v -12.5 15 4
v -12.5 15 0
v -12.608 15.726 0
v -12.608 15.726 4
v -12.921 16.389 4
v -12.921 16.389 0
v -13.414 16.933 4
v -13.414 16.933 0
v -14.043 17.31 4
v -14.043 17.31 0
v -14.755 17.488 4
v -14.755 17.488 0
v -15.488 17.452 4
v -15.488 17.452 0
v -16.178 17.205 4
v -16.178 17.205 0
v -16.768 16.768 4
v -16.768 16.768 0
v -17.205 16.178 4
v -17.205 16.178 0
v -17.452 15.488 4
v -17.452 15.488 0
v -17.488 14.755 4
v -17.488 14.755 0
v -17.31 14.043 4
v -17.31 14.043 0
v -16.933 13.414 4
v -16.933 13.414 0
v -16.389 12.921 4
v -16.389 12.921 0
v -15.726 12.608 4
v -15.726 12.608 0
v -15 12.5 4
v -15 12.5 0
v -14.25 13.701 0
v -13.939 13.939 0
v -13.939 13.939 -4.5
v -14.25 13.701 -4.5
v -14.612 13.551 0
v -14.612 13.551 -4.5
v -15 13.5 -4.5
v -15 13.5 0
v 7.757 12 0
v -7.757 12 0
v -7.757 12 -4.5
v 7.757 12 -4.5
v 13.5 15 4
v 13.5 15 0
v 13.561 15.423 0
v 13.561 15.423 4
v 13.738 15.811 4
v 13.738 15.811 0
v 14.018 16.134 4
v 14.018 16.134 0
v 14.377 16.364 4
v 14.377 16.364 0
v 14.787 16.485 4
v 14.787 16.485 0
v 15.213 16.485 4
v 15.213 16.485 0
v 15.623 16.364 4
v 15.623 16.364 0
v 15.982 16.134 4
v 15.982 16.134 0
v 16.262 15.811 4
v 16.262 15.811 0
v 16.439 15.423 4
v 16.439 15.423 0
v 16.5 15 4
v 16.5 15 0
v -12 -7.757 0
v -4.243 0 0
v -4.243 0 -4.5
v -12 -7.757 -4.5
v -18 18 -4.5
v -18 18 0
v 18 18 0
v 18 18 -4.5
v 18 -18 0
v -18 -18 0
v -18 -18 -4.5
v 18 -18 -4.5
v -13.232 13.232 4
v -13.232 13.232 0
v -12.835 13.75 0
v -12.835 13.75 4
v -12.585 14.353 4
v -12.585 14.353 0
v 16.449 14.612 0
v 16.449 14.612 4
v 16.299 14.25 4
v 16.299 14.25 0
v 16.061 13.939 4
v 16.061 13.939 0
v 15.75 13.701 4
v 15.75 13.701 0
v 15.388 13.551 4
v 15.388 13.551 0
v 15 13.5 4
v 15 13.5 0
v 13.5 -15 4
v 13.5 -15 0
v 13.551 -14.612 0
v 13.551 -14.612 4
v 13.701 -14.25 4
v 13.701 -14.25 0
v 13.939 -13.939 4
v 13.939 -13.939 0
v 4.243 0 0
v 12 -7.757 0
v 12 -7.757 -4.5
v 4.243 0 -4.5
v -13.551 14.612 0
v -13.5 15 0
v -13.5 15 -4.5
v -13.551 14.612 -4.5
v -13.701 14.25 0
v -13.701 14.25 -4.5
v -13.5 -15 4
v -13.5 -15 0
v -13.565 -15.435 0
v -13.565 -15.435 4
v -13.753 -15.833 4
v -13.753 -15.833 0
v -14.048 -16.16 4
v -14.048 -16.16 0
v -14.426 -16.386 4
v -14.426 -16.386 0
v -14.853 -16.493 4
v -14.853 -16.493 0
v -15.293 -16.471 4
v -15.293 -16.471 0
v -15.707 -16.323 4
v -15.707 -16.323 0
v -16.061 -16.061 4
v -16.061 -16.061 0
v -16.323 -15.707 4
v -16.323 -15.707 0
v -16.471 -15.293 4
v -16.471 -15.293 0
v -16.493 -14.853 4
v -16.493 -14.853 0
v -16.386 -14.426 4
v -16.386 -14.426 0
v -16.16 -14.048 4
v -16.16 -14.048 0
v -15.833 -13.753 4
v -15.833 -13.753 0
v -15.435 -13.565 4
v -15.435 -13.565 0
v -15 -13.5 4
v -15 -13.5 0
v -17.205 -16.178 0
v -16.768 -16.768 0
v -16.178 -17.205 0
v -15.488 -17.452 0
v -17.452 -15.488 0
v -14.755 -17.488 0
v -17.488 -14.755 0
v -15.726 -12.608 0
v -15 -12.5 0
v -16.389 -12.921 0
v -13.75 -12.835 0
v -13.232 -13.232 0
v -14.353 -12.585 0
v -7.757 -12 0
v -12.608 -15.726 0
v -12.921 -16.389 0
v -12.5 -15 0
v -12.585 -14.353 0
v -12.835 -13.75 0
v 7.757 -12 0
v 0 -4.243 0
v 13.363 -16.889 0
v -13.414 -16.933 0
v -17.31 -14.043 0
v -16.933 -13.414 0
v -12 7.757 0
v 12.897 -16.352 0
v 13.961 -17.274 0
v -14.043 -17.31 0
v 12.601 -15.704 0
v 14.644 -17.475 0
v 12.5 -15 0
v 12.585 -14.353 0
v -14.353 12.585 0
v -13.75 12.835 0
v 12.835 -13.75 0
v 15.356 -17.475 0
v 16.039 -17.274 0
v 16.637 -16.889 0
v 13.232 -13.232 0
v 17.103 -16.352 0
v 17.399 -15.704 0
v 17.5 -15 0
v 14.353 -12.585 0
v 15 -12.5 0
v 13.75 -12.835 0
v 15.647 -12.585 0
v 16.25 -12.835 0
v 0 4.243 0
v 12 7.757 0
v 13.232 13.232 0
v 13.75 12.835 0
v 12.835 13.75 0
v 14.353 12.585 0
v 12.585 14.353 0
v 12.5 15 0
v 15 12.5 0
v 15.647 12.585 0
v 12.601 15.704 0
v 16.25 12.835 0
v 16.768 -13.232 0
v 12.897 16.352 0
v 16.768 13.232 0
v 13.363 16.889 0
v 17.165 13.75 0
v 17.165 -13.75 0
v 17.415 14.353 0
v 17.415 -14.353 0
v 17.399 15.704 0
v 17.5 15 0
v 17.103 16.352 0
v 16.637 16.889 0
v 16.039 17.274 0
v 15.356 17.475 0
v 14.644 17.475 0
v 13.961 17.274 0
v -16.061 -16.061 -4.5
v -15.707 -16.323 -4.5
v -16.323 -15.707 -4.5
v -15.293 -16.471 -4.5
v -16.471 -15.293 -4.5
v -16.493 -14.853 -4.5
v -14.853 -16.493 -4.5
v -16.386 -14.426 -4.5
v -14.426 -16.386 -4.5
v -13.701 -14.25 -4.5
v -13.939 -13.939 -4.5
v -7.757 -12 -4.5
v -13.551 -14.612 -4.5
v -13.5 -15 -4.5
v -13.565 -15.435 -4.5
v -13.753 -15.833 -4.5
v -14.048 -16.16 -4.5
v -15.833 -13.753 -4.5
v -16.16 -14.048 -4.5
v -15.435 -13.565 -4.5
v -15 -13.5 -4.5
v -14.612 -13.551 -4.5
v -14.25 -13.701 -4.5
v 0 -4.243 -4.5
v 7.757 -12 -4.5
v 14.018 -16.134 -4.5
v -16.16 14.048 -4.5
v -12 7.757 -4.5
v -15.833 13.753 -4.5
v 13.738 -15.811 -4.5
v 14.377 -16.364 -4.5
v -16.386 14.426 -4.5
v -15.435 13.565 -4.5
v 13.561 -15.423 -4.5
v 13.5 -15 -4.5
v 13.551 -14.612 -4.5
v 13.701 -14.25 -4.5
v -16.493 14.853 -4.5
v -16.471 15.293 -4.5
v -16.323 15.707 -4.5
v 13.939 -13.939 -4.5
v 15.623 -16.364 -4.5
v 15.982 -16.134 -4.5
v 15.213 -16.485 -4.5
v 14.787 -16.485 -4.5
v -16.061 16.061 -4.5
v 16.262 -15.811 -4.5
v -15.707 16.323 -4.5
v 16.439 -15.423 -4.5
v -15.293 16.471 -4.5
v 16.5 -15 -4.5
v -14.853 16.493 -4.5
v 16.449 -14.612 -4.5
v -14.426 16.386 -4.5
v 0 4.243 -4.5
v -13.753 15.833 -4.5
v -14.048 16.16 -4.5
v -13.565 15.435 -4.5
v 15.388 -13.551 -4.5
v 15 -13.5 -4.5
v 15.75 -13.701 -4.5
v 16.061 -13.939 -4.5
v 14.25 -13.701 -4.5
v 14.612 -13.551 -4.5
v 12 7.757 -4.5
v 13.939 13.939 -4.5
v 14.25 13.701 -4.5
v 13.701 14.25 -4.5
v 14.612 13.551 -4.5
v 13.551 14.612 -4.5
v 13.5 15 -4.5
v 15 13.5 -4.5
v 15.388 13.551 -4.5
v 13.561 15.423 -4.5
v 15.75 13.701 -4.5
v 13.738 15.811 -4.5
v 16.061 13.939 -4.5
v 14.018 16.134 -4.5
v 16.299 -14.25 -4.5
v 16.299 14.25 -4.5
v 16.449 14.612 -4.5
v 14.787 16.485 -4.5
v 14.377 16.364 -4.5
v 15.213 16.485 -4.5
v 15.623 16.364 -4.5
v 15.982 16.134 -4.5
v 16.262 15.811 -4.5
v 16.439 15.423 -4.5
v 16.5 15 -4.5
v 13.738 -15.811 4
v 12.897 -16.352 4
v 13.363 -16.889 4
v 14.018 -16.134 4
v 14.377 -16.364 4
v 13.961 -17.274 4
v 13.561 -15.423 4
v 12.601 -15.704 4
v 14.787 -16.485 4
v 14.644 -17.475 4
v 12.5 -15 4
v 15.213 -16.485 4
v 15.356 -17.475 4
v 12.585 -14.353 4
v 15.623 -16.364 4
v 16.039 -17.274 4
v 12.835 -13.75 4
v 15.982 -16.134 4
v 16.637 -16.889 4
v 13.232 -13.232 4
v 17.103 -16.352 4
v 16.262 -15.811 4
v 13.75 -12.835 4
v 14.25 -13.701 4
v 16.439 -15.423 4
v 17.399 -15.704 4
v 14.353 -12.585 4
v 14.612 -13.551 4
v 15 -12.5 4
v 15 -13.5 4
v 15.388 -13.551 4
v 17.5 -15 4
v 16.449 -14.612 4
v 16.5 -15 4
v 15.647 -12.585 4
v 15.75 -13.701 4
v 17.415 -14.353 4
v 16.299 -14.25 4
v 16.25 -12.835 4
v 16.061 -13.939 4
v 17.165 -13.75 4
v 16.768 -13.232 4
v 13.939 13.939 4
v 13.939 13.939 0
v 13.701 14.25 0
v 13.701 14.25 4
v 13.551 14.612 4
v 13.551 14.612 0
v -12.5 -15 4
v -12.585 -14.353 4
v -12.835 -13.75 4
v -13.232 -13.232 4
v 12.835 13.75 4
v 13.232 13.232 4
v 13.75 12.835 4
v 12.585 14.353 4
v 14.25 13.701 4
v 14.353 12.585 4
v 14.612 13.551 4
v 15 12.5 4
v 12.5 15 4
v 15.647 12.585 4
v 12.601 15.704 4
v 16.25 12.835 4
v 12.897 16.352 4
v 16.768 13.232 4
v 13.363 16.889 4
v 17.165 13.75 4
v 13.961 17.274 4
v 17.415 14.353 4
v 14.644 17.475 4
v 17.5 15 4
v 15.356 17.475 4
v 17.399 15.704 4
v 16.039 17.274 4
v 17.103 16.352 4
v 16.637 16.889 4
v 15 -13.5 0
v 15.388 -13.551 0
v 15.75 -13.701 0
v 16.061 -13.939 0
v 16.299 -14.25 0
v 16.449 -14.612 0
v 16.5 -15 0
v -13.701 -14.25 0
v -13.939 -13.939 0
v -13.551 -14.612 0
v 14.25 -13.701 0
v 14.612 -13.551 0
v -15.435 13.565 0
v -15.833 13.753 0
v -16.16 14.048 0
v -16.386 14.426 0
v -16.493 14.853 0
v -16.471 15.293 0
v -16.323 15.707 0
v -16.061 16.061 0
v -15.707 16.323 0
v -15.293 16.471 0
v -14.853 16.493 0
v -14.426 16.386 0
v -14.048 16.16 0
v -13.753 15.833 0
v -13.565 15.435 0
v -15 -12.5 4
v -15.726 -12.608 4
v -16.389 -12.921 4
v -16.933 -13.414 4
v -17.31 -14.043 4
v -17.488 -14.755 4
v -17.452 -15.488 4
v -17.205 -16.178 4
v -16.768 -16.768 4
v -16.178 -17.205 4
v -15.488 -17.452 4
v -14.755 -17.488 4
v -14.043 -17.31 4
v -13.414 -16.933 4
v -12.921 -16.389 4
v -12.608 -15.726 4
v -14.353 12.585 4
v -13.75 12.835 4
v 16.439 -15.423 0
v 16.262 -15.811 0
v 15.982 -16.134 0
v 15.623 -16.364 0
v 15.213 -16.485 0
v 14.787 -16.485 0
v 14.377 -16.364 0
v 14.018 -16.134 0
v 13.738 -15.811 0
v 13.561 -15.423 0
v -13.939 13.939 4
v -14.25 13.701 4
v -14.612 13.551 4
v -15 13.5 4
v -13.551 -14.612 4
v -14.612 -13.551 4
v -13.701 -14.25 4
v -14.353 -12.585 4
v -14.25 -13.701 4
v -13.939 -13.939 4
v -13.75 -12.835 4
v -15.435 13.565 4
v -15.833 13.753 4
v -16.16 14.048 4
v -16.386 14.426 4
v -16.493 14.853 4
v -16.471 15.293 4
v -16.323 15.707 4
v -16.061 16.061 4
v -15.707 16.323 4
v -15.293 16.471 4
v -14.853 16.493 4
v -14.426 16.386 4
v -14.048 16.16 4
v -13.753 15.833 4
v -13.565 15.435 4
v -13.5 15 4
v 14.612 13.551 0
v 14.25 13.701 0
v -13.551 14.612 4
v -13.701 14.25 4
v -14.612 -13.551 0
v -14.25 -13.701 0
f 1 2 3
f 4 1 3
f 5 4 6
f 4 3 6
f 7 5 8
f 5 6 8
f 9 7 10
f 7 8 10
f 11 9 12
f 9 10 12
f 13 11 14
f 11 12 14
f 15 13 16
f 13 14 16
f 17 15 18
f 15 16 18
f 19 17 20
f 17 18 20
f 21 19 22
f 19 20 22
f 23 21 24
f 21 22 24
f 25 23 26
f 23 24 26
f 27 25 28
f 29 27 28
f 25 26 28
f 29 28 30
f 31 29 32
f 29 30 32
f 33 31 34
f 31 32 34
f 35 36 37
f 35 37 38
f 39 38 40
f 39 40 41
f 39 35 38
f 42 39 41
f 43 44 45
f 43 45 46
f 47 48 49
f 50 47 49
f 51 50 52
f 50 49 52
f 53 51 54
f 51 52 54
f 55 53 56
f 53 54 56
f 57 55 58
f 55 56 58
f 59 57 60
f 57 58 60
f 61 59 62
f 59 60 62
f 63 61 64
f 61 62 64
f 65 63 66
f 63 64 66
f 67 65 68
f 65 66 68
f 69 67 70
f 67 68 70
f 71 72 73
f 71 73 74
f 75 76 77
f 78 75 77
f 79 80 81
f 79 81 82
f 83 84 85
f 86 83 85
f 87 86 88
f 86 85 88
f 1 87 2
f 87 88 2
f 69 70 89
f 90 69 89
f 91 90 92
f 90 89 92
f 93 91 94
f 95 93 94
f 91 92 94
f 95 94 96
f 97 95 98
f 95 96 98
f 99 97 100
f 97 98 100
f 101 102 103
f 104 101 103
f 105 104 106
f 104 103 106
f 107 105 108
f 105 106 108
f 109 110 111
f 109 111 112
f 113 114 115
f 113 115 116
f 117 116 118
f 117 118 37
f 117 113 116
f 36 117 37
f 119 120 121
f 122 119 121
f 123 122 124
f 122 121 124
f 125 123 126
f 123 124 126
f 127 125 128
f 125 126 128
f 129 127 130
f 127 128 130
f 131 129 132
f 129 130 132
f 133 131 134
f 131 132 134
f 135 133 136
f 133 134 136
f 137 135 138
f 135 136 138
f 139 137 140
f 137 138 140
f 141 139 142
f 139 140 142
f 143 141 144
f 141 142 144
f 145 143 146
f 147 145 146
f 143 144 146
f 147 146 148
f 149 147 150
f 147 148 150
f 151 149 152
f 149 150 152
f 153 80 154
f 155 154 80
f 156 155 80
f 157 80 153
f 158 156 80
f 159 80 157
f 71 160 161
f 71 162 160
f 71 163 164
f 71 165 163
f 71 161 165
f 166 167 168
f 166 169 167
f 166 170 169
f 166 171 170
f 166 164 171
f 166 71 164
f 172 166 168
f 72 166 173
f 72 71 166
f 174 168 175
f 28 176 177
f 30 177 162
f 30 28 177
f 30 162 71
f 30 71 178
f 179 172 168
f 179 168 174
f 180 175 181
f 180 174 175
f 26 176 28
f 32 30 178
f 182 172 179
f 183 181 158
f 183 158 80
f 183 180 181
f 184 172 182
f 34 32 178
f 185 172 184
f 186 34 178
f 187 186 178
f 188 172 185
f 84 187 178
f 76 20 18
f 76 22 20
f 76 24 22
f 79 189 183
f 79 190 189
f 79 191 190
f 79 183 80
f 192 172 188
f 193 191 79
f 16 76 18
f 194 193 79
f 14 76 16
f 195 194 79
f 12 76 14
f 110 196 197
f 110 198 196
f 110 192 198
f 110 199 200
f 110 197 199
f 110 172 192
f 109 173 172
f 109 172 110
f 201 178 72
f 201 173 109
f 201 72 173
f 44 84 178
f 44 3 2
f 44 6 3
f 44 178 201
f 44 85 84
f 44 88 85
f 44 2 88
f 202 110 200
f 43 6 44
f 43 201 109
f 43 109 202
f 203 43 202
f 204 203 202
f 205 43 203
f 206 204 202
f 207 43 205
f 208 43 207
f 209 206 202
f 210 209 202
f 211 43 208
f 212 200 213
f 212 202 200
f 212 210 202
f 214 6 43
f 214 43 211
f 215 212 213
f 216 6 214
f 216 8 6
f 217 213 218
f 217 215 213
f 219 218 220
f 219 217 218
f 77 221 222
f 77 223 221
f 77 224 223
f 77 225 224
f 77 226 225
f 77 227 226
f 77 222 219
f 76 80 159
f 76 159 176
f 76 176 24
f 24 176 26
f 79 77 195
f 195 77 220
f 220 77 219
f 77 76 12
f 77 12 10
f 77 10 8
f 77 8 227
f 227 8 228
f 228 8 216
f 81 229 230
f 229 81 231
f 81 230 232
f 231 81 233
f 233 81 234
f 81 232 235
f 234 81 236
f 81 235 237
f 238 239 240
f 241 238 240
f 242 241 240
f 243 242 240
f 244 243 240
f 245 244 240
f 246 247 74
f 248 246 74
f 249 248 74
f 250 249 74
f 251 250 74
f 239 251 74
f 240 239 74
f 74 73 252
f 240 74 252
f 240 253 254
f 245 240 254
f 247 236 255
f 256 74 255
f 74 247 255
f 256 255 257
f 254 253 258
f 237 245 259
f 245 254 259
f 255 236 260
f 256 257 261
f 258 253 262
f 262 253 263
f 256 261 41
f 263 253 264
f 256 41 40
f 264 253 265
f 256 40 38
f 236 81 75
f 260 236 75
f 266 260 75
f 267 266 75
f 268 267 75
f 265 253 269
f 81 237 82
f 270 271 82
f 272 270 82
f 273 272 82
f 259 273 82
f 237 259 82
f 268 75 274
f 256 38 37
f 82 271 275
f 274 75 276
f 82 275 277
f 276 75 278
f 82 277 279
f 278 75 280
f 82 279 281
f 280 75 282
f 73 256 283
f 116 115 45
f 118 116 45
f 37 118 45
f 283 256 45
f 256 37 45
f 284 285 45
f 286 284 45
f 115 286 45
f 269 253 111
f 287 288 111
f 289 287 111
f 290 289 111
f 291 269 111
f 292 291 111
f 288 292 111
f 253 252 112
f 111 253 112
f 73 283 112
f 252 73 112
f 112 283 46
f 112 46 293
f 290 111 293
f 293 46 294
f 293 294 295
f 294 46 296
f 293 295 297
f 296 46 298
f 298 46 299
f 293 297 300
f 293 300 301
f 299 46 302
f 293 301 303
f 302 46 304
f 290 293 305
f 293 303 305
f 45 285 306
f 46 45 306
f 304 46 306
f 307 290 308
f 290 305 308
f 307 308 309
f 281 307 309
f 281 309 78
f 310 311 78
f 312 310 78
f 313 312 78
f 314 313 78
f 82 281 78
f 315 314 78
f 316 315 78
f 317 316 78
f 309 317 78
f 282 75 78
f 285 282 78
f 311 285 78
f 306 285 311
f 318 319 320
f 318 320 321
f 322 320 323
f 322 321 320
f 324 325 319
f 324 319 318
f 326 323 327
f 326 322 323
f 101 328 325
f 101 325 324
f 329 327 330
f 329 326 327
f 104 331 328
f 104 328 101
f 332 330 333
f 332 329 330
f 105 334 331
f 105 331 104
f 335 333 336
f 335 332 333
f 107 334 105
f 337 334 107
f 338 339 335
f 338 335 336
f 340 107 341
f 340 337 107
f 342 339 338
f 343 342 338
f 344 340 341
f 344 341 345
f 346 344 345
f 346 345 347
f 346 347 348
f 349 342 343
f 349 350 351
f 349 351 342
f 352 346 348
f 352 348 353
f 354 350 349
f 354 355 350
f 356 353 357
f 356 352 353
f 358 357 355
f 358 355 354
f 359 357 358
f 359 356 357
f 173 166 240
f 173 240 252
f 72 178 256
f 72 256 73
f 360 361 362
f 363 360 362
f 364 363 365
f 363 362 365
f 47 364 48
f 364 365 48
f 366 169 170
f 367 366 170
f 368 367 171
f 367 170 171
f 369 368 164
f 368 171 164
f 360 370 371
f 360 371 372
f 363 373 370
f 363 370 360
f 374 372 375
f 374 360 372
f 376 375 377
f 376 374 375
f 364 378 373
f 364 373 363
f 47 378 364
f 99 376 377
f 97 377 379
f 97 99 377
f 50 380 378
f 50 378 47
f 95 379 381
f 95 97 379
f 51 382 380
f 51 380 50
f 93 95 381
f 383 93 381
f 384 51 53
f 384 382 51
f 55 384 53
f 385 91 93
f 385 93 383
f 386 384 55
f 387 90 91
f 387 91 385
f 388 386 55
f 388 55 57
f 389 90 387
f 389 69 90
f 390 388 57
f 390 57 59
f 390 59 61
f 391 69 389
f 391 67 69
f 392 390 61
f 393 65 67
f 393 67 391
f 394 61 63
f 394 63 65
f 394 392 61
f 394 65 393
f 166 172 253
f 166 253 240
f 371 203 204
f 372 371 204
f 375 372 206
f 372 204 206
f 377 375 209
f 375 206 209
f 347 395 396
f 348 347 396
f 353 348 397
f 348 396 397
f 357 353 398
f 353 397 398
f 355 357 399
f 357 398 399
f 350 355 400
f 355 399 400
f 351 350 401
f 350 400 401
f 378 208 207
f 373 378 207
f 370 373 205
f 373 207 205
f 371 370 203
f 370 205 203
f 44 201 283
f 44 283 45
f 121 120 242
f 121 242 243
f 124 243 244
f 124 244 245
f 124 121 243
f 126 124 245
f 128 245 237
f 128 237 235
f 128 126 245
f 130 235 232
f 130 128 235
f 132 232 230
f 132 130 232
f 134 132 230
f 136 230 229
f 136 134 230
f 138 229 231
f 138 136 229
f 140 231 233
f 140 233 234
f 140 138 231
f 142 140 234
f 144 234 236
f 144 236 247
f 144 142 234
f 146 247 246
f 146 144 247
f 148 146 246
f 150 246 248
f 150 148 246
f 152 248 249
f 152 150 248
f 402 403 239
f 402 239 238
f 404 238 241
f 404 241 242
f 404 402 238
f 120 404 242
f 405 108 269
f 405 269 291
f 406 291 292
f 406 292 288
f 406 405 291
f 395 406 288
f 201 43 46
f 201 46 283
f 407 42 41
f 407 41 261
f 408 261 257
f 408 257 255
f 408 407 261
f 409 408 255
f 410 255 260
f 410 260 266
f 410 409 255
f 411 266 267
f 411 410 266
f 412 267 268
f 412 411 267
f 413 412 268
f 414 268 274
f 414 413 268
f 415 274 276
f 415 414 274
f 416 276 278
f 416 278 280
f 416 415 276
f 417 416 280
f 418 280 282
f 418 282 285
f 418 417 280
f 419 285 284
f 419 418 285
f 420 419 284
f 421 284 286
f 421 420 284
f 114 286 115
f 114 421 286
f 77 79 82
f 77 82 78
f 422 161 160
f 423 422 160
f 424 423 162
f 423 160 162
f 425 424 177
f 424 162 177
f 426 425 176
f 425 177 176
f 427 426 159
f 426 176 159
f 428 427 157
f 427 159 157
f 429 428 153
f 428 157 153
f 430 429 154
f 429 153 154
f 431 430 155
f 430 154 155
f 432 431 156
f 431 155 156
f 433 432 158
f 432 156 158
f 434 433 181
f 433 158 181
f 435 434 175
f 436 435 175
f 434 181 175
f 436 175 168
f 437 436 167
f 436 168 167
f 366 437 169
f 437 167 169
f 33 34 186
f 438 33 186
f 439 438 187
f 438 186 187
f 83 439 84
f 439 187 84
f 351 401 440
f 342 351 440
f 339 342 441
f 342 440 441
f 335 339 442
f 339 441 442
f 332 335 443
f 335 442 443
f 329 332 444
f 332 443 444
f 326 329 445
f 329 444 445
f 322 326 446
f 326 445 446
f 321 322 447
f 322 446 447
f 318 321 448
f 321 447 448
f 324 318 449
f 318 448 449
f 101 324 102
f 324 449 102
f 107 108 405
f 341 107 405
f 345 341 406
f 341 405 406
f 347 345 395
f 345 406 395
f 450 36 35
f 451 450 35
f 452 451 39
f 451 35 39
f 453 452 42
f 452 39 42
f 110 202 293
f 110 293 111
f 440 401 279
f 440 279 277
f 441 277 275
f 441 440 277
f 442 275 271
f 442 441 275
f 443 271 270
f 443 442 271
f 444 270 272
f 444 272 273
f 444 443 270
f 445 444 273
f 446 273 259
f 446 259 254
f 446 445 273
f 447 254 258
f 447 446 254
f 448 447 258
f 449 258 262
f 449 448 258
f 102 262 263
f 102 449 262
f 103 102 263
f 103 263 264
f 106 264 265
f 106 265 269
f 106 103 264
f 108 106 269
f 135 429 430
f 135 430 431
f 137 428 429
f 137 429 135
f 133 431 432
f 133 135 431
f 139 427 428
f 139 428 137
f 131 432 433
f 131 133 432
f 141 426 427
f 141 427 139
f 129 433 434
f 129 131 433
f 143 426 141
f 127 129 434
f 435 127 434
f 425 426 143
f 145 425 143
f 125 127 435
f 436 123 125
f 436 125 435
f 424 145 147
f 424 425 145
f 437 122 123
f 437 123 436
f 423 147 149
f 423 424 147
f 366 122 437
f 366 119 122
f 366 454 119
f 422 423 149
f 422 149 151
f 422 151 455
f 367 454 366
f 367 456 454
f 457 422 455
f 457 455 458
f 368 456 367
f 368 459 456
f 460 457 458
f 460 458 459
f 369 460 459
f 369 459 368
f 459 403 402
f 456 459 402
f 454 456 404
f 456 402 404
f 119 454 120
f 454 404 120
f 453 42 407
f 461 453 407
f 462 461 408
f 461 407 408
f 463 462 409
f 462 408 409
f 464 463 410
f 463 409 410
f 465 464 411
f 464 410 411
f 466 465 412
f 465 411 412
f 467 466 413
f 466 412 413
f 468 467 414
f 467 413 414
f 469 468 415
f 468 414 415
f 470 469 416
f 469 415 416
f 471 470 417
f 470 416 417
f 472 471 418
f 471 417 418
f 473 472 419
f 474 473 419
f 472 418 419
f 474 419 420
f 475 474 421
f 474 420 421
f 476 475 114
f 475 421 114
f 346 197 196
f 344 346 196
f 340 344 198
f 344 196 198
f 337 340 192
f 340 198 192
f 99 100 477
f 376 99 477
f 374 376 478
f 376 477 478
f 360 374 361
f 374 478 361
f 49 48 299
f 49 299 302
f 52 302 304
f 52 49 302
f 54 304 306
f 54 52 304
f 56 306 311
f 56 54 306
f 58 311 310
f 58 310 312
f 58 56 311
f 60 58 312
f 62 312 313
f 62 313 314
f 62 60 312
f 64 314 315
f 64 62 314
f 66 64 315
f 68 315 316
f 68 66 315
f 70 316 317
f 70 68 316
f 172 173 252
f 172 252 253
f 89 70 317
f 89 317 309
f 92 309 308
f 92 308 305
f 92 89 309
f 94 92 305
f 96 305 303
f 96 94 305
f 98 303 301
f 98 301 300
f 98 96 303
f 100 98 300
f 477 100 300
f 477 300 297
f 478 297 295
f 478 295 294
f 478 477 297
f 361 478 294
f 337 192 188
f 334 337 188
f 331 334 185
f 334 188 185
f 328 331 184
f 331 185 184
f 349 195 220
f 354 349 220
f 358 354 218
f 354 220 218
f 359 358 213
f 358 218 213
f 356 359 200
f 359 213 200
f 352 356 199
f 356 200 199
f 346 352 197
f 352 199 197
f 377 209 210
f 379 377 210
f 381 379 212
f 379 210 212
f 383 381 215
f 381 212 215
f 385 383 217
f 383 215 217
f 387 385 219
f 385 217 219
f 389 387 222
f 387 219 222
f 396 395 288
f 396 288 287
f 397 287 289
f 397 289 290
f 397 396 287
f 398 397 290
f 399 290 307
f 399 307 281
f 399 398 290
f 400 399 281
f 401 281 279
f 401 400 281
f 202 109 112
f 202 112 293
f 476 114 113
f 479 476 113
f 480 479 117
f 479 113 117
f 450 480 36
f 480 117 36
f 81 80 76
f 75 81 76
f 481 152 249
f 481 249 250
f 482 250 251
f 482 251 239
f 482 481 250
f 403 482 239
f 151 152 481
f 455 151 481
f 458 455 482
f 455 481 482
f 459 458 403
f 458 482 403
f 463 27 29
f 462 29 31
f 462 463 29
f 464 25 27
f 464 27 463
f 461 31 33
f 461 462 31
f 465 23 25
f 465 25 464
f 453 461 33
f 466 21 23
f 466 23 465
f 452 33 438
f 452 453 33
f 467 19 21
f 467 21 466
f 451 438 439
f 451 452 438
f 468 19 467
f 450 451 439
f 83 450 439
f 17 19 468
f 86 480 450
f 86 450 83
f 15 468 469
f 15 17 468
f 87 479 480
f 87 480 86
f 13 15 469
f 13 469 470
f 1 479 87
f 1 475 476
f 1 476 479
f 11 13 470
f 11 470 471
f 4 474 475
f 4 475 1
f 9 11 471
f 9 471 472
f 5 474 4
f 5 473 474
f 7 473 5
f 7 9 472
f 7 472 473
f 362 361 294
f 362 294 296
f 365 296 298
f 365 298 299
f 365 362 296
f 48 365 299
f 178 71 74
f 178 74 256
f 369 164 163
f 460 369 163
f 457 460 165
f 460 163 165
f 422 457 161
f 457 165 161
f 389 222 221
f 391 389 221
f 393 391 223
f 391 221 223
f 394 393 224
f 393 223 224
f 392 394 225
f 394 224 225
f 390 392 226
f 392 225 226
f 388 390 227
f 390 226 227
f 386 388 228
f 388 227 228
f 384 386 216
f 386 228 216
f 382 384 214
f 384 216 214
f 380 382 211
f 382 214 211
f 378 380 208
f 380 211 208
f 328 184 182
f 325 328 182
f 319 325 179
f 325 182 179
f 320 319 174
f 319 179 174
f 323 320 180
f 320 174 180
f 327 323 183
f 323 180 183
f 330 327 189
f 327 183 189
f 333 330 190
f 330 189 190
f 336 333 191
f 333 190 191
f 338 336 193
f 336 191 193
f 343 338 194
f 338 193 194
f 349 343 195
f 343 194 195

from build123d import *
from build123d import SkipClean  # not in build123d's __all__

# Parameters (mm, degrees)
F1_W     = 36
F1_H     = 36
F2_DEPTH = 4.5
F3_DEPTH = 4


with BuildPart() as f2:
    # F1 (on Top) → F2 (new body)
    with BuildSketch(Plane.XY):
        Rectangle(F1_W, F1_H)
        with BuildLine():
            ThreePointArc((-15, 12.5), (-16.767766953, 16.767766953), (-12.5, 15))
            Line((-12.5, 15), (12.5, 15))
            ThreePointArc((12.5, 15), (15, 17.5), (17.5, 15))
            ThreePointArc((17.5, 15), (16.767766953, 13.232233047), (15, 12.5))
            Line((15, 12.5), (15, -12.5))
            ThreePointArc((15, -12.5), (16.767766953, -13.232233047), (17.5, -15))
            ThreePointArc((17.5, -15), (15, -17.5), (12.5, -15))
            Line((12.5, -15), (-12.5, -15))
            ThreePointArc((-12.5, -15), (-16.767766953, -16.767766953), (-15, -12.5))
            Line((-15, -12.5), (-15, 12.5))
        make_face(mode=Mode.SUBTRACT)
        with BuildLine():
            ThreePointArc((-13.232233047, 13.232233047), (-14.0432914191, 12.6903011687), (-15, 12.5))
            Line((-15, 12.5), (-15, -12.5))
            ThreePointArc((-15, -12.5), (-14.0432914191, -12.6903011687), (-13.232233047, -13.232233047))
            Line((-13.232233047, -13.232233047), (-12, -12))
            Line((-12, -12), (-12, -7.7573593129))
            Line((-12, -7.7573593129), (-12, 7.7573593129))
            Line((-12, 7.7573593129), (-12, 12))
            Line((-12, 12), (-13.232233047, 13.232233047))
        make_face()
        with BuildLine():
            Line((12.5, 15), (-12.5, 15))
            ThreePointArc((-12.5, 15), (-12.6903011687, 14.0432914191), (-13.232233047, 13.232233047))
            Line((-13.232233047, 13.232233047), (-12, 12))
            Line((-12, 12), (-7.7573593129, 12))
            Line((-7.7573593129, 12), (7.7573593129, 12))
            Line((7.7573593129, 12), (12, 12))
            Line((12, 12), (13.232233047, 13.232233047))
            ThreePointArc((13.232233047, 13.232233047), (12.6903011687, 14.0432914191), (12.5, 15))
        make_face()
        with BuildLine():
            Line((-12, -12), (-13.232233047, -13.232233047))
            ThreePointArc((-13.232233047, -13.232233047), (-12.6903011687, -14.0432914191), (-12.5, -15))
            Line((-12.5, -15), (12.5, -15))
            ThreePointArc((12.5, -15), (12.6903011687, -14.0432914191), (13.232233047, -13.232233047))
            Line((13.232233047, -13.232233047), (12, -12))
            Line((12, -12), (7.7573593129, -12))
            Line((7.7573593129, -12), (-7.7573593129, -12))
            Line((-7.7573593129, -12), (-12, -12))
        make_face()
        with BuildLine():
            ThreePointArc((15, 12.5), (14.0432914191, 12.6903011687), (13.232233047, 13.232233047))
            Line((13.232233047, 13.232233047), (12, 12))
            Line((12, 12), (12, 7.7573593129))
            Line((12, 7.7573593129), (12, -7.7573593129))
            Line((12, -7.7573593129), (12, -12))
            Line((12, -12), (13.232233047, -13.232233047))
            ThreePointArc((13.232233047, -13.232233047), (14.0432914191, -12.6903011687), (15, -12.5))
            Line((15, -12.5), (15, 12.5))
        make_face()
        Polygon((0, 0), (-12, 12), (-12, 7.7573593129), (-4.2426406871, 0), (-2.1213203436, -2.1213203436), align=None)
        Polygon((-7.7573593129, 12), (-12, 12), (0, 0), (2.1213203436, 2.1213203436), (0, 4.2426406871), align=None)
        Polygon((2.1213203436, 2.1213203436), (0, 0), (12, -12), (12, -7.7573593129), (4.2426406871, 0), align=None)
        Polygon((12, -12), (0, 0), (-2.1213203436, -2.1213203436), (0, -4.2426406871), (7.7573593129, -12), align=None)
        Polygon((-2.1213203436, -2.1213203436), (-12, -12), (-7.7573593129, -12), (0, -4.2426406871), align=None)
        Polygon((-12, -7.7573593129), (-12, -12), (-2.1213203436, -2.1213203436), (-4.2426406871, 0), align=None)
        Polygon((2.1213203436, 2.1213203436), (12, 12), (7.7573593129, 12), (0, 4.2426406871), align=None)
        Polygon((12, 7.7573593129), (12, 12), (2.1213203436, 2.1213203436), (4.2426406871, 0), align=None)
        with BuildLine():
            Line((-13.5, 15), (-12.5, 15))
            ThreePointArc((-12.5, 15), (-16.767766953, 16.767766953), (-15, 12.5))
            Line((-15, 12.5), (-15, 13.5))
            ThreePointArc((-15, 13.5), (-16.0606601718, 16.0606601718), (-13.5, 15))
        make_face()
        with BuildLine():
            ThreePointArc((17.5, 15), (15, 17.5), (12.5, 15))
            Line((12.5, 15), (13.5, 15))
            ThreePointArc((13.5, 15), (15, 16.5), (16.5, 15))
            ThreePointArc((16.5, 15), (16.0606601718, 13.9393398282), (15, 13.5))
            Line((15, 13.5), (15, 12.5))
            ThreePointArc((15, 12.5), (16.767766953, 13.232233047), (17.5, 15))
        make_face()
        with BuildLine():
            ThreePointArc((17.5, -15), (16.767766953, -13.232233047), (15, -12.5))
            Line((15, -12.5), (15, -13.5))
            ThreePointArc((15, -13.5), (16.0606601718, -13.9393398282), (16.5, -15))
            ThreePointArc((16.5, -15), (15, -16.5), (13.5, -15))
            Line((13.5, -15), (12.5, -15))
            ThreePointArc((12.5, -15), (15, -17.5), (17.5, -15))
        make_face()
        with BuildLine():
            Line((-15, -13.5), (-15, -12.5))
            ThreePointArc((-15, -12.5), (-16.767766953, -16.767766953), (-12.5, -15))
            Line((-12.5, -15), (-13.5, -15))
            ThreePointArc((-13.5, -15), (-16.0606601718, -16.0606601718), (-15, -13.5))
        make_face()
        with BuildLine():
            Line((-15, 13.5), (-15, 12.5))
            ThreePointArc((-15, 12.5), (-14.0432914191, 12.6903011687), (-13.232233047, 13.232233047))
            Line((-13.232233047, 13.232233047), (-13.9393398282, 13.9393398282))
            ThreePointArc((-13.9393398282, 13.9393398282), (-14.4259748515, 13.6141807012), (-15, 13.5))
        make_face()
        with BuildLine():
            ThreePointArc((-13.232233047, 13.232233047), (-12.6903011687, 14.0432914191), (-12.5, 15))
            Line((-12.5, 15), (-13.5, 15))
            ThreePointArc((-13.5, 15), (-13.6141807012, 14.4259748515), (-13.9393398282, 13.9393398282))
            Line((-13.9393398282, 13.9393398282), (-13.232233047, 13.232233047))
        make_face()
        with BuildLine():
            Line((13.9393398282, 13.9393398282), (13.232233047, 13.232233047))
            ThreePointArc((13.232233047, 13.232233047), (14.0432914191, 12.6903011687), (15, 12.5))
            Line((15, 12.5), (15, 13.5))
            ThreePointArc((15, 13.5), (14.4259748515, 13.6141807012), (13.9393398282, 13.9393398282))
        make_face()
        with BuildLine():
            Line((13.5, 15), (12.5, 15))
            ThreePointArc((12.5, 15), (12.6903011687, 14.0432914191), (13.232233047, 13.232233047))
            Line((13.232233047, 13.232233047), (13.9393398282, 13.9393398282))
            ThreePointArc((13.9393398282, 13.9393398282), (13.6141807012, 14.4259748515), (13.5, 15))
        make_face()
        with BuildLine():
            ThreePointArc((13.232233047, -13.232233047), (12.6903011687, -14.0432914191), (12.5, -15))
            Line((12.5, -15), (13.5, -15))
            ThreePointArc((13.5, -15), (13.6141807012, -14.4259748515), (13.9393398282, -13.9393398282))
            Line((13.9393398282, -13.9393398282), (13.232233047, -13.232233047))
        make_face()
        with BuildLine():
            Line((15, -13.5), (15, -12.5))
            ThreePointArc((15, -12.5), (14.0432914191, -12.6903011687), (13.232233047, -13.232233047))
            Line((13.232233047, -13.232233047), (13.9393398282, -13.9393398282))
            ThreePointArc((13.9393398282, -13.9393398282), (14.4259748515, -13.6141807012), (15, -13.5))
        make_face()
        with BuildLine():
            ThreePointArc((-12.5, -15), (-12.6903011687, -14.0432914191), (-13.232233047, -13.232233047))
            Line((-13.232233047, -13.232233047), (-13.9393398282, -13.9393398282))
            ThreePointArc((-13.9393398282, -13.9393398282), (-13.6141807012, -14.4259748515), (-13.5, -15))
            Line((-13.5, -15), (-12.5, -15))
        make_face()
        with BuildLine():
            ThreePointArc((-13.232233047, -13.232233047), (-14.0432914191, -12.6903011687), (-15, -12.5))
            Line((-15, -12.5), (-15, -13.5))
            ThreePointArc((-15, -13.5), (-14.4259748515, -13.6141807012), (-13.9393398282, -13.9393398282))
            Line((-13.9393398282, -13.9393398282), (-13.232233047, -13.232233047))
        make_face()
    extrude(amount=-F2_DEPTH)

    # F1 (on Top) → F3 (join)
    with BuildSketch(Plane.XY):
        with BuildLine():
            Line((-13.5, 15), (-12.5, 15))
            ThreePointArc((-12.5, 15), (-16.767766953, 16.767766953), (-15, 12.5))
            Line((-15, 12.5), (-15, 13.5))
            ThreePointArc((-15, 13.5), (-16.0606601718, 16.0606601718), (-13.5, 15))
        make_face()
        with BuildLine():
            Line((-15, 13.5), (-15, 12.5))
            ThreePointArc((-15, 12.5), (-14.0432914191, 12.6903011687), (-13.232233047, 13.232233047))
            Line((-13.232233047, 13.232233047), (-13.9393398282, 13.9393398282))
            ThreePointArc((-13.9393398282, 13.9393398282), (-14.4259748515, 13.6141807012), (-15, 13.5))
        make_face()
        with BuildLine():
            ThreePointArc((-13.232233047, 13.232233047), (-12.6903011687, 14.0432914191), (-12.5, 15))
            Line((-12.5, 15), (-13.5, 15))
            ThreePointArc((-13.5, 15), (-13.6141807012, 14.4259748515), (-13.9393398282, 13.9393398282))
            Line((-13.9393398282, 13.9393398282), (-13.232233047, 13.232233047))
        make_face()
        with BuildLine():
            ThreePointArc((17.5, 15), (15, 17.5), (12.5, 15))
            Line((12.5, 15), (13.5, 15))
            ThreePointArc((13.5, 15), (15, 16.5), (16.5, 15))
            ThreePointArc((16.5, 15), (16.0606601718, 13.9393398282), (15, 13.5))
            Line((15, 13.5), (15, 12.5))
            ThreePointArc((15, 12.5), (16.767766953, 13.232233047), (17.5, 15))
        make_face()
        with BuildLine():
            Line((13.9393398282, 13.9393398282), (13.232233047, 13.232233047))
            ThreePointArc((13.232233047, 13.232233047), (14.0432914191, 12.6903011687), (15, 12.5))
            Line((15, 12.5), (15, 13.5))
            ThreePointArc((15, 13.5), (14.4259748515, 13.6141807012), (13.9393398282, 13.9393398282))
        make_face()
        with BuildLine():
            Line((13.5, 15), (12.5, 15))
            ThreePointArc((12.5, 15), (12.6903011687, 14.0432914191), (13.232233047, 13.232233047))
            Line((13.232233047, 13.232233047), (13.9393398282, 13.9393398282))
            ThreePointArc((13.9393398282, 13.9393398282), (13.6141807012, 14.4259748515), (13.5, 15))
        make_face()
        with BuildLine():
            Line((-15, -13.5), (-15, -12.5))
            ThreePointArc((-15, -12.5), (-16.767766953, -16.767766953), (-12.5, -15))
            Line((-12.5, -15), (-13.5, -15))
            ThreePointArc((-13.5, -15), (-16.0606601718, -16.0606601718), (-15, -13.5))
        make_face()
        with BuildLine():
            ThreePointArc((-13.232233047, -13.232233047), (-14.0432914191, -12.6903011687), (-15, -12.5))
            Line((-15, -12.5), (-15, -13.5))
            ThreePointArc((-15, -13.5), (-14.4259748515, -13.6141807012), (-13.9393398282, -13.9393398282))
            Line((-13.9393398282, -13.9393398282), (-13.232233047, -13.232233047))
        make_face()
        with BuildLine():
            ThreePointArc((-12.5, -15), (-12.6903011687, -14.0432914191), (-13.232233047, -13.232233047))
            Line((-13.232233047, -13.232233047), (-13.9393398282, -13.9393398282))
            ThreePointArc((-13.9393398282, -13.9393398282), (-13.6141807012, -14.4259748515), (-13.5, -15))
            Line((-13.5, -15), (-12.5, -15))
        make_face()
        with BuildLine():
            Line((15, -13.5), (15, -12.5))
            ThreePointArc((15, -12.5), (14.0432914191, -12.6903011687), (13.232233047, -13.232233047))
            Line((13.232233047, -13.232233047), (13.9393398282, -13.9393398282))
            ThreePointArc((13.9393398282, -13.9393398282), (14.4259748515, -13.6141807012), (15, -13.5))
        make_face()
        with BuildLine():
            ThreePointArc((13.232233047, -13.232233047), (12.6903011687, -14.0432914191), (12.5, -15))
            Line((12.5, -15), (13.5, -15))
            ThreePointArc((13.5, -15), (13.6141807012, -14.4259748515), (13.9393398282, -13.9393398282))
            Line((13.9393398282, -13.9393398282), (13.232233047, -13.232233047))
        make_face()
        with BuildLine():
            ThreePointArc((17.5, -15), (16.767766953, -13.232233047), (15, -12.5))
            Line((15, -12.5), (15, -13.5))
            ThreePointArc((15, -13.5), (16.0606601718, -13.9393398282), (16.5, -15))
            ThreePointArc((16.5, -15), (15, -16.5), (13.5, -15))
            Line((13.5, -15), (12.5, -15))
            ThreePointArc((12.5, -15), (15, -17.5), (17.5, -15))
        make_face()
    with SkipClean():  # cleaning this boolean's faces spoils the solid; the shape is the same uncleaned
        extrude(amount=F3_DEPTH)


solid = f2.part
